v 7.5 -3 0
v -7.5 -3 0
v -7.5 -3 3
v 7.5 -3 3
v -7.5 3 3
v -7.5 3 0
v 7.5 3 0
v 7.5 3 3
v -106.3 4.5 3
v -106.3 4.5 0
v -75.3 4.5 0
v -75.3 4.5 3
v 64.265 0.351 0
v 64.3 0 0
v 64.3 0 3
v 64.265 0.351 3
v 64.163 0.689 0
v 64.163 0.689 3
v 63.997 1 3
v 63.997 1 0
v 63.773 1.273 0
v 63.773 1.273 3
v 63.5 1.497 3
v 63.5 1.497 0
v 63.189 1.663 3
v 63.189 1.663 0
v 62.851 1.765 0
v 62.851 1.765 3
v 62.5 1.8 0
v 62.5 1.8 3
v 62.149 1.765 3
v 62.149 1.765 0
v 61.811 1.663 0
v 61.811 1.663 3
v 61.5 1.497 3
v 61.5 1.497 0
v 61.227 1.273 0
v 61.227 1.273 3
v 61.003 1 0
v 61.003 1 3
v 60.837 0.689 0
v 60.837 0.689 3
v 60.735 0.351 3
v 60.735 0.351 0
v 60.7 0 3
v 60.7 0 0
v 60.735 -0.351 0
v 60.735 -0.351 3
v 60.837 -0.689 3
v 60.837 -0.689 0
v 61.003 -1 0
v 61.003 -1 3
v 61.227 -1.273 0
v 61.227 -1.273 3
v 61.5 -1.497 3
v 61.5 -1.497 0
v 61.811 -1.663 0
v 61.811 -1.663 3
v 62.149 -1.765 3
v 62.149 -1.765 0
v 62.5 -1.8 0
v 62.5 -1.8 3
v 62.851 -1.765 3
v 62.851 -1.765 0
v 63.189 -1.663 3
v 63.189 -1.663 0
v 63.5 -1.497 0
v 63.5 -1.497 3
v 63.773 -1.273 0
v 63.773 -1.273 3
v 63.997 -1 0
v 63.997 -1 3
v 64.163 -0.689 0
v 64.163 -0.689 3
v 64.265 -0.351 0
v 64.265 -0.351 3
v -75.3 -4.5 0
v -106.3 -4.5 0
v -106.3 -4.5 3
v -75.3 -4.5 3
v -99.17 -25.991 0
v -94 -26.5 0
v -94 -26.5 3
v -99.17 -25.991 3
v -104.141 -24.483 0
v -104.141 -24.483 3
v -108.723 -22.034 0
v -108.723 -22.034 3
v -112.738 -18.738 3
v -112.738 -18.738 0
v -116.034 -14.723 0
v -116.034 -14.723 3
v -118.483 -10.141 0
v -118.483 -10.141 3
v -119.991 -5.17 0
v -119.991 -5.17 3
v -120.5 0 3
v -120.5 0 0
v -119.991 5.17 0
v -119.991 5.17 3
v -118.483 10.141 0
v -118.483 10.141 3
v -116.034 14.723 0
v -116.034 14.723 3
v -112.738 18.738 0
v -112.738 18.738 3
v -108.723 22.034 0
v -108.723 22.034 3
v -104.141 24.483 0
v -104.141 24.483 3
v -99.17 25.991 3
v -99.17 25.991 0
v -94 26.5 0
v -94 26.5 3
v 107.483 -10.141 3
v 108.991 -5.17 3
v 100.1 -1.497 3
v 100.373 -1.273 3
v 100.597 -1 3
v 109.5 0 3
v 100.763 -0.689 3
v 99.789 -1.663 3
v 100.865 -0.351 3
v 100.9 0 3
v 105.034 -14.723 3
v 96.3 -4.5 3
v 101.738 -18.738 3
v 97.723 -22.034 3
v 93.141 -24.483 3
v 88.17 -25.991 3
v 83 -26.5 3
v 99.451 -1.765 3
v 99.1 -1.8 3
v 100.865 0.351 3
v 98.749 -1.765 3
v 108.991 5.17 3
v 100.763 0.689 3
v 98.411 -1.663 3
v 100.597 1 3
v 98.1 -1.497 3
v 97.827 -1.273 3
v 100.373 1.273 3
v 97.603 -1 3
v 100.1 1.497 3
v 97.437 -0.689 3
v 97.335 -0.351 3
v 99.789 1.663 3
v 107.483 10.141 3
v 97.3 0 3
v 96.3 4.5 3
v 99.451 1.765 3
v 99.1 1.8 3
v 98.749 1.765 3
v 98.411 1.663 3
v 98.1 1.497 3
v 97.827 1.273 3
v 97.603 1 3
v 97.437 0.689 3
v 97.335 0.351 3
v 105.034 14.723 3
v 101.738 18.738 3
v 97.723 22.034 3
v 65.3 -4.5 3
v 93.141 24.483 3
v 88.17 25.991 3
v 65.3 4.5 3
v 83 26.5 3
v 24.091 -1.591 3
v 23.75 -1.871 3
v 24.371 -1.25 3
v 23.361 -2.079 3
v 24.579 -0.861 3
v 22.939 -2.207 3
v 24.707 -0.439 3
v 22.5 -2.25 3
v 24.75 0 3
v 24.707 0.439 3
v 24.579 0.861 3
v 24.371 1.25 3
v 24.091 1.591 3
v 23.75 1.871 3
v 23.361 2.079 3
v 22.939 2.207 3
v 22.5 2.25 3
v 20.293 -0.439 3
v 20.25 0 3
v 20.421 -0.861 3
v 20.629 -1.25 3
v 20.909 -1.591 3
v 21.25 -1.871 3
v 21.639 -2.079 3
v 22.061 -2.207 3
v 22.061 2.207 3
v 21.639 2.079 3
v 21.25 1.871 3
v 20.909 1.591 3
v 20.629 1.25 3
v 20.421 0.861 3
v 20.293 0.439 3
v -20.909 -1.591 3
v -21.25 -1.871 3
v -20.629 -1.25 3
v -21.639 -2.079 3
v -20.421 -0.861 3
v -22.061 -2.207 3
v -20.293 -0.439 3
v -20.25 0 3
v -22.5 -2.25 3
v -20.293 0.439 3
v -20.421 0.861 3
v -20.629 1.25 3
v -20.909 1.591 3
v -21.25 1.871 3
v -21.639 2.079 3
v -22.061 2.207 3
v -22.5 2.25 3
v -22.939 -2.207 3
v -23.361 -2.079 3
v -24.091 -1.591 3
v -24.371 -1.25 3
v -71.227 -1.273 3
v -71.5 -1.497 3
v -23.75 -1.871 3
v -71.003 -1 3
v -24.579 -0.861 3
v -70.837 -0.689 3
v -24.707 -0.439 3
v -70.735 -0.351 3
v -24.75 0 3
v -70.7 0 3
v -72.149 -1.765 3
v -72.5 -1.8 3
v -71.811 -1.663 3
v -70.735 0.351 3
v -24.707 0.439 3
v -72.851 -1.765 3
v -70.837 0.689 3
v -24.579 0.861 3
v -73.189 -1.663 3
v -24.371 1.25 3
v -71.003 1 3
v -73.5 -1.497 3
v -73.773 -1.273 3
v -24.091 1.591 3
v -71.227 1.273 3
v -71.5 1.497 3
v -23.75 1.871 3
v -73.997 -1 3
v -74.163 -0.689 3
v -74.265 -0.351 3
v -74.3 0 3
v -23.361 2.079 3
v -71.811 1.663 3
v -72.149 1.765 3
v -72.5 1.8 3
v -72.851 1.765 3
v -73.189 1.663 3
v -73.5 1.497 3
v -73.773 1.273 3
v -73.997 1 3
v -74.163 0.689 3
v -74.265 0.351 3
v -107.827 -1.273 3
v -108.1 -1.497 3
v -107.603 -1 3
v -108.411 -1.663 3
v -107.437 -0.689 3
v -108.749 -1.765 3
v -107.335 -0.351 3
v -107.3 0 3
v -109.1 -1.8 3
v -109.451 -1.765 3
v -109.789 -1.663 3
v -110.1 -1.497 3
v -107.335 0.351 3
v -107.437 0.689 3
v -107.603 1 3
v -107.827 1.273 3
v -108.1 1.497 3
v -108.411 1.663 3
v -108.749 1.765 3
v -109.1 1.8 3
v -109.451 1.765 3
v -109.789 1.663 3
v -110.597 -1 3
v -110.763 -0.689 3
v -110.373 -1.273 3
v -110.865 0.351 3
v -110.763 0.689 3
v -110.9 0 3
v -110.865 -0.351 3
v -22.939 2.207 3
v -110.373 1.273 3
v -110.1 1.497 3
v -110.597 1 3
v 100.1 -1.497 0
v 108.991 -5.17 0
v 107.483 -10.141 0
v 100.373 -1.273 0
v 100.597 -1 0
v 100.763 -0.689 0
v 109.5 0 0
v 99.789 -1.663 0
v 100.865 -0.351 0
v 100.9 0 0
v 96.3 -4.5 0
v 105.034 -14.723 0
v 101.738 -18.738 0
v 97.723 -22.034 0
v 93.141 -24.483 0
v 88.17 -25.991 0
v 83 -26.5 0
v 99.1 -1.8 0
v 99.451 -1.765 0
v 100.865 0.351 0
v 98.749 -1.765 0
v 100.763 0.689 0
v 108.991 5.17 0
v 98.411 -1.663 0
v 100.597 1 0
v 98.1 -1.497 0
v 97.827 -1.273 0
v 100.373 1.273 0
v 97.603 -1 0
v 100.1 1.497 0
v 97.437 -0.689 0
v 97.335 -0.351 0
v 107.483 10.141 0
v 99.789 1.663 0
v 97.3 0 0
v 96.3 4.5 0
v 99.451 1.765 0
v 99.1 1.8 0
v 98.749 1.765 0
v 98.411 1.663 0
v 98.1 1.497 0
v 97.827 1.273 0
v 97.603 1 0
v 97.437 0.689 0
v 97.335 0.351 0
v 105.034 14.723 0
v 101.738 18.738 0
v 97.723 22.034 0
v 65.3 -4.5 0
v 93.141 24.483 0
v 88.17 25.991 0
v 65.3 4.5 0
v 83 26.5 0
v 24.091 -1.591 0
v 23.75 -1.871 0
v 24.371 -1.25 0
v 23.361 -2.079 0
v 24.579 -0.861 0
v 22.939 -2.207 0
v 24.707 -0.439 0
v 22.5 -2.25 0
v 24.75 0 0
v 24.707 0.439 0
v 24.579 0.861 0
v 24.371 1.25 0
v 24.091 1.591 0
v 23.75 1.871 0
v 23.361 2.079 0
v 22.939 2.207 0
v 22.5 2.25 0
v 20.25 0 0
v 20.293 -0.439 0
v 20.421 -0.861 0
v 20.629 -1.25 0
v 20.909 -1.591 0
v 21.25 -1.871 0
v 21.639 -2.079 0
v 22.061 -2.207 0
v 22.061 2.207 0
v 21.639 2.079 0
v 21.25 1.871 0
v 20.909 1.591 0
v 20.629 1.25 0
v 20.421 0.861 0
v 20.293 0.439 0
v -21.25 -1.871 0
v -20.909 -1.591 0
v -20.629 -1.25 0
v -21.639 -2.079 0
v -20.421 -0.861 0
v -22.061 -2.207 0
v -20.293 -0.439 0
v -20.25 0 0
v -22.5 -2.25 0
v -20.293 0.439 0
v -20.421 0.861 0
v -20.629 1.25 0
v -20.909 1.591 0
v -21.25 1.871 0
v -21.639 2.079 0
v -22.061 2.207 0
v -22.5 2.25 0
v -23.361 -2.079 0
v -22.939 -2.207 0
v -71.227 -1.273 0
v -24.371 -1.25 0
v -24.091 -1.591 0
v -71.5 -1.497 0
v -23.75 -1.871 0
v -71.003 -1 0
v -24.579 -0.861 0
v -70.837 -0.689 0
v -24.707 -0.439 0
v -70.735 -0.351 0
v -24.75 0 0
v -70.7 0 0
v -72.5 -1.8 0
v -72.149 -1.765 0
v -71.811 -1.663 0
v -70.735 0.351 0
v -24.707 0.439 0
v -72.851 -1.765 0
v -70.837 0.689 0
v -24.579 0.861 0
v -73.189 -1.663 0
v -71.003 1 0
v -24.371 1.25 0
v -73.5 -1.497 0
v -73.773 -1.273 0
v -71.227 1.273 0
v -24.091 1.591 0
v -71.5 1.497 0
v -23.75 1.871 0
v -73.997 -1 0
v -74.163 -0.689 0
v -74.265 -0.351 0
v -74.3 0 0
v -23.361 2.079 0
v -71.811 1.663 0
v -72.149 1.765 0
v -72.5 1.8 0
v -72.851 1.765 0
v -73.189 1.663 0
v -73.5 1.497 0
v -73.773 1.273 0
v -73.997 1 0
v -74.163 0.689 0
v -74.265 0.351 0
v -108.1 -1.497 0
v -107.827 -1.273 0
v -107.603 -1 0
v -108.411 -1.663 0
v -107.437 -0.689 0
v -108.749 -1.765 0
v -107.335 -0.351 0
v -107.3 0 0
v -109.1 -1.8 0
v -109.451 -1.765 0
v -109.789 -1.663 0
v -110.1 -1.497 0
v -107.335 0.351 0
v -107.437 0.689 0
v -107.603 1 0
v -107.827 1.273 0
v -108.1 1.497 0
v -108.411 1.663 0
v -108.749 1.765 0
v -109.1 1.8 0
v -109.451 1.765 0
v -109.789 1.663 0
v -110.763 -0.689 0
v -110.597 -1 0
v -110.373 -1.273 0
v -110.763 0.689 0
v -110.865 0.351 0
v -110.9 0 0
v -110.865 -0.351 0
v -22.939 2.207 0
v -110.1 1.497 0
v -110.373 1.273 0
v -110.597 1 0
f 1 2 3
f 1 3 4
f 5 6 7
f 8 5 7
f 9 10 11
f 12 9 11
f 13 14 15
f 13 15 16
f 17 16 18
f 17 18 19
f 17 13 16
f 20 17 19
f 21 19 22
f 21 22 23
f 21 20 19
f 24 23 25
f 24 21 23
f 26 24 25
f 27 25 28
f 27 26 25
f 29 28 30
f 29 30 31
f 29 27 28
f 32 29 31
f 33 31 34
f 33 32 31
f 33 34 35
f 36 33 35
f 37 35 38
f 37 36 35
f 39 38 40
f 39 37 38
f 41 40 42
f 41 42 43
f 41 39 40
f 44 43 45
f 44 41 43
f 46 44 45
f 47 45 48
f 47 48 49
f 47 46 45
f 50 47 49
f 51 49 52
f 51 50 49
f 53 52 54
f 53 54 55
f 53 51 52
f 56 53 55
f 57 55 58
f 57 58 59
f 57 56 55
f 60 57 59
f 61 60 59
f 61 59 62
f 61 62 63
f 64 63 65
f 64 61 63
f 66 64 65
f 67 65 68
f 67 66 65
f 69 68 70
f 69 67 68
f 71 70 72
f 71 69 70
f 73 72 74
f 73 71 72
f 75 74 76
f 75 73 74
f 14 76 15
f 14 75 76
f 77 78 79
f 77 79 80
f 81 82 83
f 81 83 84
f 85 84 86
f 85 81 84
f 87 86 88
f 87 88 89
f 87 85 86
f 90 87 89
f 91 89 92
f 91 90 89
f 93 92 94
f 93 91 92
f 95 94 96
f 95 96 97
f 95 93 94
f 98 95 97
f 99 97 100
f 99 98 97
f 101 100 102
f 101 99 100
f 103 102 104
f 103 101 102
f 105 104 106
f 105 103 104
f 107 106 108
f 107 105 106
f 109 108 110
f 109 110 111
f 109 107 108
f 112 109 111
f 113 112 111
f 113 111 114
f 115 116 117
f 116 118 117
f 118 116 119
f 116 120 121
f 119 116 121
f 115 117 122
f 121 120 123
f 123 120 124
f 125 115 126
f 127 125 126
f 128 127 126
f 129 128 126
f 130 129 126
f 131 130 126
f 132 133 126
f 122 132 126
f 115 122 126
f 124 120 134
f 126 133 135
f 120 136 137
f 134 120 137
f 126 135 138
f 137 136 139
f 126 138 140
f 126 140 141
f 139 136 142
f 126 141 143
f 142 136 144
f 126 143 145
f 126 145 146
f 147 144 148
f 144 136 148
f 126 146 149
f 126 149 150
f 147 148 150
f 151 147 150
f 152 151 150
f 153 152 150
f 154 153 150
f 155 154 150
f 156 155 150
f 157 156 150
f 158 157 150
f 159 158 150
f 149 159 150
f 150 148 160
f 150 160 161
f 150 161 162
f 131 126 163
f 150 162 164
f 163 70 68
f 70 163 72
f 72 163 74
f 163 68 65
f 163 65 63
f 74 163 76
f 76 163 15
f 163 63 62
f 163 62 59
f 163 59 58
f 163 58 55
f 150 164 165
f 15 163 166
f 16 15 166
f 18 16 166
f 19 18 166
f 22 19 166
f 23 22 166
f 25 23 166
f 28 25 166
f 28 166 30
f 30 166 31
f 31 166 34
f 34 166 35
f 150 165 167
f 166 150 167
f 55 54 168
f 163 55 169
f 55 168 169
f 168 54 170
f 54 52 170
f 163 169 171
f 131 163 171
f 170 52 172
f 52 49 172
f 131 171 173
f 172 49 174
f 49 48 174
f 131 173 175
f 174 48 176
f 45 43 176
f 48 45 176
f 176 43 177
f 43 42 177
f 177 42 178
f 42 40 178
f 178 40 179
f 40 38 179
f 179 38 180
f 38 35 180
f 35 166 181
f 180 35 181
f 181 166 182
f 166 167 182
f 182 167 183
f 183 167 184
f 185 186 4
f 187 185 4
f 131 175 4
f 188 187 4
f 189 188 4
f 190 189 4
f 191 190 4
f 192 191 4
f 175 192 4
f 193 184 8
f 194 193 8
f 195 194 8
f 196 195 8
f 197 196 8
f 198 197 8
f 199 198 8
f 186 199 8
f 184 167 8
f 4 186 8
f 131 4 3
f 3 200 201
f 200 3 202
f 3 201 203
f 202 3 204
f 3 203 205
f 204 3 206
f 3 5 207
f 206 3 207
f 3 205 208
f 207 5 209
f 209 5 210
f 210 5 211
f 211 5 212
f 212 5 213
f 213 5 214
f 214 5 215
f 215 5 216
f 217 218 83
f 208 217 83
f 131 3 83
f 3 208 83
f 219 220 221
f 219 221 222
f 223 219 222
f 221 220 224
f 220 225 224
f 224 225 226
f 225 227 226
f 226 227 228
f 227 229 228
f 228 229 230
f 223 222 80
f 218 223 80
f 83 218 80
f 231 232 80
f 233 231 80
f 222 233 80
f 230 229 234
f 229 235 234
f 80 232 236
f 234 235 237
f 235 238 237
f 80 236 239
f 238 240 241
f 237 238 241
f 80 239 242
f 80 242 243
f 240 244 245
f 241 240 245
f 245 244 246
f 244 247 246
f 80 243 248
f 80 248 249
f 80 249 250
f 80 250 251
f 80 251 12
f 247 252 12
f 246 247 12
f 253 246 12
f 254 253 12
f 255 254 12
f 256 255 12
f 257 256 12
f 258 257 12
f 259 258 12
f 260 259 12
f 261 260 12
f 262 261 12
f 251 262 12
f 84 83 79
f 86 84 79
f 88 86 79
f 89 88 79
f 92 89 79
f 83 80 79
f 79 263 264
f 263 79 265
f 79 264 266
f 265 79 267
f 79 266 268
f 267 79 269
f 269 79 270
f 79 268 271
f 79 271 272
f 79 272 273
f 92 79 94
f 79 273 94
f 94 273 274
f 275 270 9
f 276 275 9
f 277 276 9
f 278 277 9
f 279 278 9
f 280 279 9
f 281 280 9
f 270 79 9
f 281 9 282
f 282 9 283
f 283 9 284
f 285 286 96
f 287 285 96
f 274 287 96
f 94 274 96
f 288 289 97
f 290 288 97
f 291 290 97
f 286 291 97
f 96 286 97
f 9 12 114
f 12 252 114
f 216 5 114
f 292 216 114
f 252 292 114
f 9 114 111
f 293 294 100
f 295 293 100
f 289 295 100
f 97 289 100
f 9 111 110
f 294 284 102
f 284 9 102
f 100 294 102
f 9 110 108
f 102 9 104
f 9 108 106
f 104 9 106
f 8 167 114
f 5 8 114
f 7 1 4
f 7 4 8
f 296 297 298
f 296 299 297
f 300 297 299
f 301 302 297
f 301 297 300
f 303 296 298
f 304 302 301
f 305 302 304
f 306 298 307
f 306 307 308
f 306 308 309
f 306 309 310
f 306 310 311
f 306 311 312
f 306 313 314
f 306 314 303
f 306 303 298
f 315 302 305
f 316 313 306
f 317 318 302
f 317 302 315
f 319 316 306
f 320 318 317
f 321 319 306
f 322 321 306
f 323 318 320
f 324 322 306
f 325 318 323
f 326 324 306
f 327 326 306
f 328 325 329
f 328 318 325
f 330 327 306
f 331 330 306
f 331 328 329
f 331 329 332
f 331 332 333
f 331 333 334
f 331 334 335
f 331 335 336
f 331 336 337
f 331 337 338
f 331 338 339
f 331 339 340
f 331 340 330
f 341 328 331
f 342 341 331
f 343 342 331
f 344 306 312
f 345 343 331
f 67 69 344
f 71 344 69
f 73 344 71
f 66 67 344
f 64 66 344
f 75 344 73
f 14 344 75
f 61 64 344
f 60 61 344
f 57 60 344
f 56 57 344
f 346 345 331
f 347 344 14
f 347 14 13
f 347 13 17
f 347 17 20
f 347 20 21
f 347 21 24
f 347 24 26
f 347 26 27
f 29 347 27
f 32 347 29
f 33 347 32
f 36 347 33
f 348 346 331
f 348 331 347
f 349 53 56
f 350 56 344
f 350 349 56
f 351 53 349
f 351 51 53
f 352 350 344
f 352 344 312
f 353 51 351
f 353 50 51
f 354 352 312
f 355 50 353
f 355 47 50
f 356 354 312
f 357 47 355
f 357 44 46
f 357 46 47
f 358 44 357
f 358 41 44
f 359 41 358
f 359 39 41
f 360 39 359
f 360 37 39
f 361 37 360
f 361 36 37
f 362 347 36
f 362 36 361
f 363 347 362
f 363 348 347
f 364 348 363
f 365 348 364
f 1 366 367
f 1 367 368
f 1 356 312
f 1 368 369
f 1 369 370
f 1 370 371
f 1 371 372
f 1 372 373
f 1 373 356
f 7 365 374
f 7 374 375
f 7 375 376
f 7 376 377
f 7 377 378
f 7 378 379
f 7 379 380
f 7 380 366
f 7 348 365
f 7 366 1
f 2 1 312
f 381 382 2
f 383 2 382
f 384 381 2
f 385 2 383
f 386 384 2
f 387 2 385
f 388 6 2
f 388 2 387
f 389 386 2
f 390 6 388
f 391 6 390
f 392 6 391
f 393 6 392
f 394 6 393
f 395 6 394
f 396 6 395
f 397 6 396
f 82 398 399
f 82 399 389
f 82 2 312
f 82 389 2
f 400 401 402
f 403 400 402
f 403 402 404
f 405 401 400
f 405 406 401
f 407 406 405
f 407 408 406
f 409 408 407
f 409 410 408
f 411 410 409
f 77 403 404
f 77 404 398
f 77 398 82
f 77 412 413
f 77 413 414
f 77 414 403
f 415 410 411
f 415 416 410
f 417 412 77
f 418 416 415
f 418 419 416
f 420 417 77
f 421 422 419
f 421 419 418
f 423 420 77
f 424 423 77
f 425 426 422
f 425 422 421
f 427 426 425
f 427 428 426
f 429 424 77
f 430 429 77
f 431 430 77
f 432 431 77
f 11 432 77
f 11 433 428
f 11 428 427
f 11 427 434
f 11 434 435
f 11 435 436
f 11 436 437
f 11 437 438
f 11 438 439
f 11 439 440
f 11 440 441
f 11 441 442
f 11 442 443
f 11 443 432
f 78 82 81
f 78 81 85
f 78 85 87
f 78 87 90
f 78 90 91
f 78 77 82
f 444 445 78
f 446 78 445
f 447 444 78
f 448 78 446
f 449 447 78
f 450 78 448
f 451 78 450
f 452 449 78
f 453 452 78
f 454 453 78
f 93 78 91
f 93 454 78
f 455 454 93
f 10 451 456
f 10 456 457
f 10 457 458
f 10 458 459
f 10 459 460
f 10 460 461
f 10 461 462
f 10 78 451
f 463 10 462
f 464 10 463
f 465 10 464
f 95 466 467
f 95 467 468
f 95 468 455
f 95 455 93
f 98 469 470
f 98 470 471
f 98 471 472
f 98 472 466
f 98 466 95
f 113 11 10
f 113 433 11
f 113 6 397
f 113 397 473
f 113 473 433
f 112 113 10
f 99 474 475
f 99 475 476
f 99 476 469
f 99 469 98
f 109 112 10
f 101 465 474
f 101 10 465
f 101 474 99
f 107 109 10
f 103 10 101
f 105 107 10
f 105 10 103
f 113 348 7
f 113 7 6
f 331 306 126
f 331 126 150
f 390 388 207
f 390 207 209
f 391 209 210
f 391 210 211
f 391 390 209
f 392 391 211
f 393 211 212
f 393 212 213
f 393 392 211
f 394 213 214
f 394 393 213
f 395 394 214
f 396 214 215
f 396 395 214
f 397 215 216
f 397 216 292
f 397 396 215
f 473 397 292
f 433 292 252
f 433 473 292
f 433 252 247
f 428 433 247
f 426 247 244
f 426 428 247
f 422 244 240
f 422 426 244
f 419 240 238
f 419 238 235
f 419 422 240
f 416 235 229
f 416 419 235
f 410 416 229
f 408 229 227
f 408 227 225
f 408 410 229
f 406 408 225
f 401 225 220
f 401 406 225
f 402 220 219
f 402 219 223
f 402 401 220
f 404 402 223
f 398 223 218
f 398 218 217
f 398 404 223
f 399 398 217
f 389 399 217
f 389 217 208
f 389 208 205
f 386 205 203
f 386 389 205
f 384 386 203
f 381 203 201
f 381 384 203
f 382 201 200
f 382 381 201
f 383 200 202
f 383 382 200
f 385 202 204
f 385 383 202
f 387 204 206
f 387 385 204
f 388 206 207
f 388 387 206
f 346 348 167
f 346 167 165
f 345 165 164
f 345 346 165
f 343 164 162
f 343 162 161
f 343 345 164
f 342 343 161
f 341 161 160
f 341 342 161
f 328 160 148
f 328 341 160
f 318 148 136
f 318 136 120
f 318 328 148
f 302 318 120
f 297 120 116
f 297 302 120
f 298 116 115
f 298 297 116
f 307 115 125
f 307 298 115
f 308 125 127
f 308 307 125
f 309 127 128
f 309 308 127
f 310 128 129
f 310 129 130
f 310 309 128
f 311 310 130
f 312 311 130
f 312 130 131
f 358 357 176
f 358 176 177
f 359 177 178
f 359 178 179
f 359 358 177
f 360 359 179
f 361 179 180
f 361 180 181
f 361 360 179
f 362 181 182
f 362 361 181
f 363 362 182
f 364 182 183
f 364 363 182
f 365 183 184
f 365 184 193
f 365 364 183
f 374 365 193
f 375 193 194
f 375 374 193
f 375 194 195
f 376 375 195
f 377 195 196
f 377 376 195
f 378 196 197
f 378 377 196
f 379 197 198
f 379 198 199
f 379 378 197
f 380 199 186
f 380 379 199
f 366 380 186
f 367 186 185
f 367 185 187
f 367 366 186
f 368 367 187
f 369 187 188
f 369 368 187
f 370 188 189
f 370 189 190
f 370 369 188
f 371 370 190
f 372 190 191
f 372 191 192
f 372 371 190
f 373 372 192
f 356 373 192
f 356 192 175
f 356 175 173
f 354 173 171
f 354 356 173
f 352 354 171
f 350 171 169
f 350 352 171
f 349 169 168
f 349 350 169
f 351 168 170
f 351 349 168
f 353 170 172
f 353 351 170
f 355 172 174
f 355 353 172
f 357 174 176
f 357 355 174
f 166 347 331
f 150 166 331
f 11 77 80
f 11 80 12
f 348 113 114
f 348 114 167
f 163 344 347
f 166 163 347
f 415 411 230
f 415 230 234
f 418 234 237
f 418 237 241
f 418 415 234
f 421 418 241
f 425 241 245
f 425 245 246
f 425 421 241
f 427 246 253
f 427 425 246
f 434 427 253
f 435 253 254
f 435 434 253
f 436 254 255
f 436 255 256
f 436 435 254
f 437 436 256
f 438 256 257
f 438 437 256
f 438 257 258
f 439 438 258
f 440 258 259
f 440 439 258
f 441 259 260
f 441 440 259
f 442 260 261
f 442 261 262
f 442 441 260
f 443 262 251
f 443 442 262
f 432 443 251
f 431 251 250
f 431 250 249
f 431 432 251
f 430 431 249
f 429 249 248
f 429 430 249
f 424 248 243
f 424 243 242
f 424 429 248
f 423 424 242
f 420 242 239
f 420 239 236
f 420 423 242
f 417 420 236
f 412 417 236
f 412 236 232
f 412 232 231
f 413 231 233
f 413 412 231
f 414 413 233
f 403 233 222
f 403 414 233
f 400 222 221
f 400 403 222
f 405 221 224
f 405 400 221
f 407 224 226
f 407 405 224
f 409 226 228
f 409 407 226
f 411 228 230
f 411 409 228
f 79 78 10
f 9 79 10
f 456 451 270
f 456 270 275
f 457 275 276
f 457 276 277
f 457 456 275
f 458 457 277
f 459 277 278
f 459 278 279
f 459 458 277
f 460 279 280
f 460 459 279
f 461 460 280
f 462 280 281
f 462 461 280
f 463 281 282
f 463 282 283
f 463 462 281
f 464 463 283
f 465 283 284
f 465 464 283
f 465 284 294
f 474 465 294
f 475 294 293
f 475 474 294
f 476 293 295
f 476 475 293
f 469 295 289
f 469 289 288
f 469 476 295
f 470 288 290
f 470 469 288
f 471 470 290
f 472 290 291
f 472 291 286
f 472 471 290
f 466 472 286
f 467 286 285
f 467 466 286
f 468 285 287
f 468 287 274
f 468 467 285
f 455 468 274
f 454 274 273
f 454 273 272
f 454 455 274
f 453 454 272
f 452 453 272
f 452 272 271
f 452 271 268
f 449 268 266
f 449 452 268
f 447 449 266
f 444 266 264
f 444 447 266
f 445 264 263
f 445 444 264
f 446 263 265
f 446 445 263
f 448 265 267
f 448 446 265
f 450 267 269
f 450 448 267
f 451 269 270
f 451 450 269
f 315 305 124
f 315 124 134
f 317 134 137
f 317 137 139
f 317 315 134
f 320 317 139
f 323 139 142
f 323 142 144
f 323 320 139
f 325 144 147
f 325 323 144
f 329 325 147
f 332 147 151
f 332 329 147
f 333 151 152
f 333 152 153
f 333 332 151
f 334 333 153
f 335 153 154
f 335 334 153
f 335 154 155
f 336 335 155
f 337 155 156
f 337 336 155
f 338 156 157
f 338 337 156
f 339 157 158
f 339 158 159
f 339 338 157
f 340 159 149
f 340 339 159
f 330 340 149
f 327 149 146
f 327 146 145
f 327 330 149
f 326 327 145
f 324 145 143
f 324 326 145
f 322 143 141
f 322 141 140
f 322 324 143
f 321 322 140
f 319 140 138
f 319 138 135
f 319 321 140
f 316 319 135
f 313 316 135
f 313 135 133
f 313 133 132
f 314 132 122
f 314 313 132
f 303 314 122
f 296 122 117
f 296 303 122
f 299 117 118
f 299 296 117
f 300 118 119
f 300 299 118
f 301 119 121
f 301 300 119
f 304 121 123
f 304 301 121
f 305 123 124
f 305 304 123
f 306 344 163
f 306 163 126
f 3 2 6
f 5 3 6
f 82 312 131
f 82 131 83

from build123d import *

# Parameters (mm, degrees)
ESBO_O1_R                = 2.25
ESBO_O1_R_2              = 1.8
ESBO_O1_W                = 15
ESBO_O1_H                = 6
ESBO_O1_W_2              = 31
ESBO_O1_H_2              = 9
RESSALTO_EXTRUS_O1_DEPTH = 3


with BuildPart() as part:
    # Esboço1 → Ressalto-extrusão1 (new body)
    with BuildSketch(Plane.XY):
        with BuildLine():
            Line((-94, 26.5), (83, 26.5))
            ThreePointArc((83, 26.5), (109.5, 0), (83, -26.5))
            Line((83, -26.5), (-94, -26.5))
            ThreePointArc((-94, -26.5), (-120.5, 0), (-94, 26.5))
        make_face()
        with Locations((-22.5, 0)):
            Circle(ESBO_O1_R, mode=Mode.SUBTRACT)
        with Locations((22.5, 0)):
            Circle(ESBO_O1_R, mode=Mode.SUBTRACT)
        with Locations((-109.1, 0)):
            Circle(ESBO_O1_R_2, mode=Mode.SUBTRACT)
        with Locations((-72.5, 0)):
            Circle(ESBO_O1_R_2, mode=Mode.SUBTRACT)
        with Locations((62.5, 0)):
            Circle(ESBO_O1_R_2, mode=Mode.SUBTRACT)
        with Locations((99.1, 0)):
            Circle(ESBO_O1_R_2, mode=Mode.SUBTRACT)
        Rectangle(ESBO_O1_W, ESBO_O1_H, mode=Mode.SUBTRACT)
        with Locations((-90.8, 0)):
            Rectangle(ESBO_O1_W_2, ESBO_O1_H_2, mode=Mode.SUBTRACT)
        with Locations((80.8, 0)):
            Rectangle(ESBO_O1_W_2, ESBO_O1_H_2, mode=Mode.SUBTRACT)
    extrude(amount=RESSALTO_EXTRUS_O1_DEPTH)


solid = part.part
